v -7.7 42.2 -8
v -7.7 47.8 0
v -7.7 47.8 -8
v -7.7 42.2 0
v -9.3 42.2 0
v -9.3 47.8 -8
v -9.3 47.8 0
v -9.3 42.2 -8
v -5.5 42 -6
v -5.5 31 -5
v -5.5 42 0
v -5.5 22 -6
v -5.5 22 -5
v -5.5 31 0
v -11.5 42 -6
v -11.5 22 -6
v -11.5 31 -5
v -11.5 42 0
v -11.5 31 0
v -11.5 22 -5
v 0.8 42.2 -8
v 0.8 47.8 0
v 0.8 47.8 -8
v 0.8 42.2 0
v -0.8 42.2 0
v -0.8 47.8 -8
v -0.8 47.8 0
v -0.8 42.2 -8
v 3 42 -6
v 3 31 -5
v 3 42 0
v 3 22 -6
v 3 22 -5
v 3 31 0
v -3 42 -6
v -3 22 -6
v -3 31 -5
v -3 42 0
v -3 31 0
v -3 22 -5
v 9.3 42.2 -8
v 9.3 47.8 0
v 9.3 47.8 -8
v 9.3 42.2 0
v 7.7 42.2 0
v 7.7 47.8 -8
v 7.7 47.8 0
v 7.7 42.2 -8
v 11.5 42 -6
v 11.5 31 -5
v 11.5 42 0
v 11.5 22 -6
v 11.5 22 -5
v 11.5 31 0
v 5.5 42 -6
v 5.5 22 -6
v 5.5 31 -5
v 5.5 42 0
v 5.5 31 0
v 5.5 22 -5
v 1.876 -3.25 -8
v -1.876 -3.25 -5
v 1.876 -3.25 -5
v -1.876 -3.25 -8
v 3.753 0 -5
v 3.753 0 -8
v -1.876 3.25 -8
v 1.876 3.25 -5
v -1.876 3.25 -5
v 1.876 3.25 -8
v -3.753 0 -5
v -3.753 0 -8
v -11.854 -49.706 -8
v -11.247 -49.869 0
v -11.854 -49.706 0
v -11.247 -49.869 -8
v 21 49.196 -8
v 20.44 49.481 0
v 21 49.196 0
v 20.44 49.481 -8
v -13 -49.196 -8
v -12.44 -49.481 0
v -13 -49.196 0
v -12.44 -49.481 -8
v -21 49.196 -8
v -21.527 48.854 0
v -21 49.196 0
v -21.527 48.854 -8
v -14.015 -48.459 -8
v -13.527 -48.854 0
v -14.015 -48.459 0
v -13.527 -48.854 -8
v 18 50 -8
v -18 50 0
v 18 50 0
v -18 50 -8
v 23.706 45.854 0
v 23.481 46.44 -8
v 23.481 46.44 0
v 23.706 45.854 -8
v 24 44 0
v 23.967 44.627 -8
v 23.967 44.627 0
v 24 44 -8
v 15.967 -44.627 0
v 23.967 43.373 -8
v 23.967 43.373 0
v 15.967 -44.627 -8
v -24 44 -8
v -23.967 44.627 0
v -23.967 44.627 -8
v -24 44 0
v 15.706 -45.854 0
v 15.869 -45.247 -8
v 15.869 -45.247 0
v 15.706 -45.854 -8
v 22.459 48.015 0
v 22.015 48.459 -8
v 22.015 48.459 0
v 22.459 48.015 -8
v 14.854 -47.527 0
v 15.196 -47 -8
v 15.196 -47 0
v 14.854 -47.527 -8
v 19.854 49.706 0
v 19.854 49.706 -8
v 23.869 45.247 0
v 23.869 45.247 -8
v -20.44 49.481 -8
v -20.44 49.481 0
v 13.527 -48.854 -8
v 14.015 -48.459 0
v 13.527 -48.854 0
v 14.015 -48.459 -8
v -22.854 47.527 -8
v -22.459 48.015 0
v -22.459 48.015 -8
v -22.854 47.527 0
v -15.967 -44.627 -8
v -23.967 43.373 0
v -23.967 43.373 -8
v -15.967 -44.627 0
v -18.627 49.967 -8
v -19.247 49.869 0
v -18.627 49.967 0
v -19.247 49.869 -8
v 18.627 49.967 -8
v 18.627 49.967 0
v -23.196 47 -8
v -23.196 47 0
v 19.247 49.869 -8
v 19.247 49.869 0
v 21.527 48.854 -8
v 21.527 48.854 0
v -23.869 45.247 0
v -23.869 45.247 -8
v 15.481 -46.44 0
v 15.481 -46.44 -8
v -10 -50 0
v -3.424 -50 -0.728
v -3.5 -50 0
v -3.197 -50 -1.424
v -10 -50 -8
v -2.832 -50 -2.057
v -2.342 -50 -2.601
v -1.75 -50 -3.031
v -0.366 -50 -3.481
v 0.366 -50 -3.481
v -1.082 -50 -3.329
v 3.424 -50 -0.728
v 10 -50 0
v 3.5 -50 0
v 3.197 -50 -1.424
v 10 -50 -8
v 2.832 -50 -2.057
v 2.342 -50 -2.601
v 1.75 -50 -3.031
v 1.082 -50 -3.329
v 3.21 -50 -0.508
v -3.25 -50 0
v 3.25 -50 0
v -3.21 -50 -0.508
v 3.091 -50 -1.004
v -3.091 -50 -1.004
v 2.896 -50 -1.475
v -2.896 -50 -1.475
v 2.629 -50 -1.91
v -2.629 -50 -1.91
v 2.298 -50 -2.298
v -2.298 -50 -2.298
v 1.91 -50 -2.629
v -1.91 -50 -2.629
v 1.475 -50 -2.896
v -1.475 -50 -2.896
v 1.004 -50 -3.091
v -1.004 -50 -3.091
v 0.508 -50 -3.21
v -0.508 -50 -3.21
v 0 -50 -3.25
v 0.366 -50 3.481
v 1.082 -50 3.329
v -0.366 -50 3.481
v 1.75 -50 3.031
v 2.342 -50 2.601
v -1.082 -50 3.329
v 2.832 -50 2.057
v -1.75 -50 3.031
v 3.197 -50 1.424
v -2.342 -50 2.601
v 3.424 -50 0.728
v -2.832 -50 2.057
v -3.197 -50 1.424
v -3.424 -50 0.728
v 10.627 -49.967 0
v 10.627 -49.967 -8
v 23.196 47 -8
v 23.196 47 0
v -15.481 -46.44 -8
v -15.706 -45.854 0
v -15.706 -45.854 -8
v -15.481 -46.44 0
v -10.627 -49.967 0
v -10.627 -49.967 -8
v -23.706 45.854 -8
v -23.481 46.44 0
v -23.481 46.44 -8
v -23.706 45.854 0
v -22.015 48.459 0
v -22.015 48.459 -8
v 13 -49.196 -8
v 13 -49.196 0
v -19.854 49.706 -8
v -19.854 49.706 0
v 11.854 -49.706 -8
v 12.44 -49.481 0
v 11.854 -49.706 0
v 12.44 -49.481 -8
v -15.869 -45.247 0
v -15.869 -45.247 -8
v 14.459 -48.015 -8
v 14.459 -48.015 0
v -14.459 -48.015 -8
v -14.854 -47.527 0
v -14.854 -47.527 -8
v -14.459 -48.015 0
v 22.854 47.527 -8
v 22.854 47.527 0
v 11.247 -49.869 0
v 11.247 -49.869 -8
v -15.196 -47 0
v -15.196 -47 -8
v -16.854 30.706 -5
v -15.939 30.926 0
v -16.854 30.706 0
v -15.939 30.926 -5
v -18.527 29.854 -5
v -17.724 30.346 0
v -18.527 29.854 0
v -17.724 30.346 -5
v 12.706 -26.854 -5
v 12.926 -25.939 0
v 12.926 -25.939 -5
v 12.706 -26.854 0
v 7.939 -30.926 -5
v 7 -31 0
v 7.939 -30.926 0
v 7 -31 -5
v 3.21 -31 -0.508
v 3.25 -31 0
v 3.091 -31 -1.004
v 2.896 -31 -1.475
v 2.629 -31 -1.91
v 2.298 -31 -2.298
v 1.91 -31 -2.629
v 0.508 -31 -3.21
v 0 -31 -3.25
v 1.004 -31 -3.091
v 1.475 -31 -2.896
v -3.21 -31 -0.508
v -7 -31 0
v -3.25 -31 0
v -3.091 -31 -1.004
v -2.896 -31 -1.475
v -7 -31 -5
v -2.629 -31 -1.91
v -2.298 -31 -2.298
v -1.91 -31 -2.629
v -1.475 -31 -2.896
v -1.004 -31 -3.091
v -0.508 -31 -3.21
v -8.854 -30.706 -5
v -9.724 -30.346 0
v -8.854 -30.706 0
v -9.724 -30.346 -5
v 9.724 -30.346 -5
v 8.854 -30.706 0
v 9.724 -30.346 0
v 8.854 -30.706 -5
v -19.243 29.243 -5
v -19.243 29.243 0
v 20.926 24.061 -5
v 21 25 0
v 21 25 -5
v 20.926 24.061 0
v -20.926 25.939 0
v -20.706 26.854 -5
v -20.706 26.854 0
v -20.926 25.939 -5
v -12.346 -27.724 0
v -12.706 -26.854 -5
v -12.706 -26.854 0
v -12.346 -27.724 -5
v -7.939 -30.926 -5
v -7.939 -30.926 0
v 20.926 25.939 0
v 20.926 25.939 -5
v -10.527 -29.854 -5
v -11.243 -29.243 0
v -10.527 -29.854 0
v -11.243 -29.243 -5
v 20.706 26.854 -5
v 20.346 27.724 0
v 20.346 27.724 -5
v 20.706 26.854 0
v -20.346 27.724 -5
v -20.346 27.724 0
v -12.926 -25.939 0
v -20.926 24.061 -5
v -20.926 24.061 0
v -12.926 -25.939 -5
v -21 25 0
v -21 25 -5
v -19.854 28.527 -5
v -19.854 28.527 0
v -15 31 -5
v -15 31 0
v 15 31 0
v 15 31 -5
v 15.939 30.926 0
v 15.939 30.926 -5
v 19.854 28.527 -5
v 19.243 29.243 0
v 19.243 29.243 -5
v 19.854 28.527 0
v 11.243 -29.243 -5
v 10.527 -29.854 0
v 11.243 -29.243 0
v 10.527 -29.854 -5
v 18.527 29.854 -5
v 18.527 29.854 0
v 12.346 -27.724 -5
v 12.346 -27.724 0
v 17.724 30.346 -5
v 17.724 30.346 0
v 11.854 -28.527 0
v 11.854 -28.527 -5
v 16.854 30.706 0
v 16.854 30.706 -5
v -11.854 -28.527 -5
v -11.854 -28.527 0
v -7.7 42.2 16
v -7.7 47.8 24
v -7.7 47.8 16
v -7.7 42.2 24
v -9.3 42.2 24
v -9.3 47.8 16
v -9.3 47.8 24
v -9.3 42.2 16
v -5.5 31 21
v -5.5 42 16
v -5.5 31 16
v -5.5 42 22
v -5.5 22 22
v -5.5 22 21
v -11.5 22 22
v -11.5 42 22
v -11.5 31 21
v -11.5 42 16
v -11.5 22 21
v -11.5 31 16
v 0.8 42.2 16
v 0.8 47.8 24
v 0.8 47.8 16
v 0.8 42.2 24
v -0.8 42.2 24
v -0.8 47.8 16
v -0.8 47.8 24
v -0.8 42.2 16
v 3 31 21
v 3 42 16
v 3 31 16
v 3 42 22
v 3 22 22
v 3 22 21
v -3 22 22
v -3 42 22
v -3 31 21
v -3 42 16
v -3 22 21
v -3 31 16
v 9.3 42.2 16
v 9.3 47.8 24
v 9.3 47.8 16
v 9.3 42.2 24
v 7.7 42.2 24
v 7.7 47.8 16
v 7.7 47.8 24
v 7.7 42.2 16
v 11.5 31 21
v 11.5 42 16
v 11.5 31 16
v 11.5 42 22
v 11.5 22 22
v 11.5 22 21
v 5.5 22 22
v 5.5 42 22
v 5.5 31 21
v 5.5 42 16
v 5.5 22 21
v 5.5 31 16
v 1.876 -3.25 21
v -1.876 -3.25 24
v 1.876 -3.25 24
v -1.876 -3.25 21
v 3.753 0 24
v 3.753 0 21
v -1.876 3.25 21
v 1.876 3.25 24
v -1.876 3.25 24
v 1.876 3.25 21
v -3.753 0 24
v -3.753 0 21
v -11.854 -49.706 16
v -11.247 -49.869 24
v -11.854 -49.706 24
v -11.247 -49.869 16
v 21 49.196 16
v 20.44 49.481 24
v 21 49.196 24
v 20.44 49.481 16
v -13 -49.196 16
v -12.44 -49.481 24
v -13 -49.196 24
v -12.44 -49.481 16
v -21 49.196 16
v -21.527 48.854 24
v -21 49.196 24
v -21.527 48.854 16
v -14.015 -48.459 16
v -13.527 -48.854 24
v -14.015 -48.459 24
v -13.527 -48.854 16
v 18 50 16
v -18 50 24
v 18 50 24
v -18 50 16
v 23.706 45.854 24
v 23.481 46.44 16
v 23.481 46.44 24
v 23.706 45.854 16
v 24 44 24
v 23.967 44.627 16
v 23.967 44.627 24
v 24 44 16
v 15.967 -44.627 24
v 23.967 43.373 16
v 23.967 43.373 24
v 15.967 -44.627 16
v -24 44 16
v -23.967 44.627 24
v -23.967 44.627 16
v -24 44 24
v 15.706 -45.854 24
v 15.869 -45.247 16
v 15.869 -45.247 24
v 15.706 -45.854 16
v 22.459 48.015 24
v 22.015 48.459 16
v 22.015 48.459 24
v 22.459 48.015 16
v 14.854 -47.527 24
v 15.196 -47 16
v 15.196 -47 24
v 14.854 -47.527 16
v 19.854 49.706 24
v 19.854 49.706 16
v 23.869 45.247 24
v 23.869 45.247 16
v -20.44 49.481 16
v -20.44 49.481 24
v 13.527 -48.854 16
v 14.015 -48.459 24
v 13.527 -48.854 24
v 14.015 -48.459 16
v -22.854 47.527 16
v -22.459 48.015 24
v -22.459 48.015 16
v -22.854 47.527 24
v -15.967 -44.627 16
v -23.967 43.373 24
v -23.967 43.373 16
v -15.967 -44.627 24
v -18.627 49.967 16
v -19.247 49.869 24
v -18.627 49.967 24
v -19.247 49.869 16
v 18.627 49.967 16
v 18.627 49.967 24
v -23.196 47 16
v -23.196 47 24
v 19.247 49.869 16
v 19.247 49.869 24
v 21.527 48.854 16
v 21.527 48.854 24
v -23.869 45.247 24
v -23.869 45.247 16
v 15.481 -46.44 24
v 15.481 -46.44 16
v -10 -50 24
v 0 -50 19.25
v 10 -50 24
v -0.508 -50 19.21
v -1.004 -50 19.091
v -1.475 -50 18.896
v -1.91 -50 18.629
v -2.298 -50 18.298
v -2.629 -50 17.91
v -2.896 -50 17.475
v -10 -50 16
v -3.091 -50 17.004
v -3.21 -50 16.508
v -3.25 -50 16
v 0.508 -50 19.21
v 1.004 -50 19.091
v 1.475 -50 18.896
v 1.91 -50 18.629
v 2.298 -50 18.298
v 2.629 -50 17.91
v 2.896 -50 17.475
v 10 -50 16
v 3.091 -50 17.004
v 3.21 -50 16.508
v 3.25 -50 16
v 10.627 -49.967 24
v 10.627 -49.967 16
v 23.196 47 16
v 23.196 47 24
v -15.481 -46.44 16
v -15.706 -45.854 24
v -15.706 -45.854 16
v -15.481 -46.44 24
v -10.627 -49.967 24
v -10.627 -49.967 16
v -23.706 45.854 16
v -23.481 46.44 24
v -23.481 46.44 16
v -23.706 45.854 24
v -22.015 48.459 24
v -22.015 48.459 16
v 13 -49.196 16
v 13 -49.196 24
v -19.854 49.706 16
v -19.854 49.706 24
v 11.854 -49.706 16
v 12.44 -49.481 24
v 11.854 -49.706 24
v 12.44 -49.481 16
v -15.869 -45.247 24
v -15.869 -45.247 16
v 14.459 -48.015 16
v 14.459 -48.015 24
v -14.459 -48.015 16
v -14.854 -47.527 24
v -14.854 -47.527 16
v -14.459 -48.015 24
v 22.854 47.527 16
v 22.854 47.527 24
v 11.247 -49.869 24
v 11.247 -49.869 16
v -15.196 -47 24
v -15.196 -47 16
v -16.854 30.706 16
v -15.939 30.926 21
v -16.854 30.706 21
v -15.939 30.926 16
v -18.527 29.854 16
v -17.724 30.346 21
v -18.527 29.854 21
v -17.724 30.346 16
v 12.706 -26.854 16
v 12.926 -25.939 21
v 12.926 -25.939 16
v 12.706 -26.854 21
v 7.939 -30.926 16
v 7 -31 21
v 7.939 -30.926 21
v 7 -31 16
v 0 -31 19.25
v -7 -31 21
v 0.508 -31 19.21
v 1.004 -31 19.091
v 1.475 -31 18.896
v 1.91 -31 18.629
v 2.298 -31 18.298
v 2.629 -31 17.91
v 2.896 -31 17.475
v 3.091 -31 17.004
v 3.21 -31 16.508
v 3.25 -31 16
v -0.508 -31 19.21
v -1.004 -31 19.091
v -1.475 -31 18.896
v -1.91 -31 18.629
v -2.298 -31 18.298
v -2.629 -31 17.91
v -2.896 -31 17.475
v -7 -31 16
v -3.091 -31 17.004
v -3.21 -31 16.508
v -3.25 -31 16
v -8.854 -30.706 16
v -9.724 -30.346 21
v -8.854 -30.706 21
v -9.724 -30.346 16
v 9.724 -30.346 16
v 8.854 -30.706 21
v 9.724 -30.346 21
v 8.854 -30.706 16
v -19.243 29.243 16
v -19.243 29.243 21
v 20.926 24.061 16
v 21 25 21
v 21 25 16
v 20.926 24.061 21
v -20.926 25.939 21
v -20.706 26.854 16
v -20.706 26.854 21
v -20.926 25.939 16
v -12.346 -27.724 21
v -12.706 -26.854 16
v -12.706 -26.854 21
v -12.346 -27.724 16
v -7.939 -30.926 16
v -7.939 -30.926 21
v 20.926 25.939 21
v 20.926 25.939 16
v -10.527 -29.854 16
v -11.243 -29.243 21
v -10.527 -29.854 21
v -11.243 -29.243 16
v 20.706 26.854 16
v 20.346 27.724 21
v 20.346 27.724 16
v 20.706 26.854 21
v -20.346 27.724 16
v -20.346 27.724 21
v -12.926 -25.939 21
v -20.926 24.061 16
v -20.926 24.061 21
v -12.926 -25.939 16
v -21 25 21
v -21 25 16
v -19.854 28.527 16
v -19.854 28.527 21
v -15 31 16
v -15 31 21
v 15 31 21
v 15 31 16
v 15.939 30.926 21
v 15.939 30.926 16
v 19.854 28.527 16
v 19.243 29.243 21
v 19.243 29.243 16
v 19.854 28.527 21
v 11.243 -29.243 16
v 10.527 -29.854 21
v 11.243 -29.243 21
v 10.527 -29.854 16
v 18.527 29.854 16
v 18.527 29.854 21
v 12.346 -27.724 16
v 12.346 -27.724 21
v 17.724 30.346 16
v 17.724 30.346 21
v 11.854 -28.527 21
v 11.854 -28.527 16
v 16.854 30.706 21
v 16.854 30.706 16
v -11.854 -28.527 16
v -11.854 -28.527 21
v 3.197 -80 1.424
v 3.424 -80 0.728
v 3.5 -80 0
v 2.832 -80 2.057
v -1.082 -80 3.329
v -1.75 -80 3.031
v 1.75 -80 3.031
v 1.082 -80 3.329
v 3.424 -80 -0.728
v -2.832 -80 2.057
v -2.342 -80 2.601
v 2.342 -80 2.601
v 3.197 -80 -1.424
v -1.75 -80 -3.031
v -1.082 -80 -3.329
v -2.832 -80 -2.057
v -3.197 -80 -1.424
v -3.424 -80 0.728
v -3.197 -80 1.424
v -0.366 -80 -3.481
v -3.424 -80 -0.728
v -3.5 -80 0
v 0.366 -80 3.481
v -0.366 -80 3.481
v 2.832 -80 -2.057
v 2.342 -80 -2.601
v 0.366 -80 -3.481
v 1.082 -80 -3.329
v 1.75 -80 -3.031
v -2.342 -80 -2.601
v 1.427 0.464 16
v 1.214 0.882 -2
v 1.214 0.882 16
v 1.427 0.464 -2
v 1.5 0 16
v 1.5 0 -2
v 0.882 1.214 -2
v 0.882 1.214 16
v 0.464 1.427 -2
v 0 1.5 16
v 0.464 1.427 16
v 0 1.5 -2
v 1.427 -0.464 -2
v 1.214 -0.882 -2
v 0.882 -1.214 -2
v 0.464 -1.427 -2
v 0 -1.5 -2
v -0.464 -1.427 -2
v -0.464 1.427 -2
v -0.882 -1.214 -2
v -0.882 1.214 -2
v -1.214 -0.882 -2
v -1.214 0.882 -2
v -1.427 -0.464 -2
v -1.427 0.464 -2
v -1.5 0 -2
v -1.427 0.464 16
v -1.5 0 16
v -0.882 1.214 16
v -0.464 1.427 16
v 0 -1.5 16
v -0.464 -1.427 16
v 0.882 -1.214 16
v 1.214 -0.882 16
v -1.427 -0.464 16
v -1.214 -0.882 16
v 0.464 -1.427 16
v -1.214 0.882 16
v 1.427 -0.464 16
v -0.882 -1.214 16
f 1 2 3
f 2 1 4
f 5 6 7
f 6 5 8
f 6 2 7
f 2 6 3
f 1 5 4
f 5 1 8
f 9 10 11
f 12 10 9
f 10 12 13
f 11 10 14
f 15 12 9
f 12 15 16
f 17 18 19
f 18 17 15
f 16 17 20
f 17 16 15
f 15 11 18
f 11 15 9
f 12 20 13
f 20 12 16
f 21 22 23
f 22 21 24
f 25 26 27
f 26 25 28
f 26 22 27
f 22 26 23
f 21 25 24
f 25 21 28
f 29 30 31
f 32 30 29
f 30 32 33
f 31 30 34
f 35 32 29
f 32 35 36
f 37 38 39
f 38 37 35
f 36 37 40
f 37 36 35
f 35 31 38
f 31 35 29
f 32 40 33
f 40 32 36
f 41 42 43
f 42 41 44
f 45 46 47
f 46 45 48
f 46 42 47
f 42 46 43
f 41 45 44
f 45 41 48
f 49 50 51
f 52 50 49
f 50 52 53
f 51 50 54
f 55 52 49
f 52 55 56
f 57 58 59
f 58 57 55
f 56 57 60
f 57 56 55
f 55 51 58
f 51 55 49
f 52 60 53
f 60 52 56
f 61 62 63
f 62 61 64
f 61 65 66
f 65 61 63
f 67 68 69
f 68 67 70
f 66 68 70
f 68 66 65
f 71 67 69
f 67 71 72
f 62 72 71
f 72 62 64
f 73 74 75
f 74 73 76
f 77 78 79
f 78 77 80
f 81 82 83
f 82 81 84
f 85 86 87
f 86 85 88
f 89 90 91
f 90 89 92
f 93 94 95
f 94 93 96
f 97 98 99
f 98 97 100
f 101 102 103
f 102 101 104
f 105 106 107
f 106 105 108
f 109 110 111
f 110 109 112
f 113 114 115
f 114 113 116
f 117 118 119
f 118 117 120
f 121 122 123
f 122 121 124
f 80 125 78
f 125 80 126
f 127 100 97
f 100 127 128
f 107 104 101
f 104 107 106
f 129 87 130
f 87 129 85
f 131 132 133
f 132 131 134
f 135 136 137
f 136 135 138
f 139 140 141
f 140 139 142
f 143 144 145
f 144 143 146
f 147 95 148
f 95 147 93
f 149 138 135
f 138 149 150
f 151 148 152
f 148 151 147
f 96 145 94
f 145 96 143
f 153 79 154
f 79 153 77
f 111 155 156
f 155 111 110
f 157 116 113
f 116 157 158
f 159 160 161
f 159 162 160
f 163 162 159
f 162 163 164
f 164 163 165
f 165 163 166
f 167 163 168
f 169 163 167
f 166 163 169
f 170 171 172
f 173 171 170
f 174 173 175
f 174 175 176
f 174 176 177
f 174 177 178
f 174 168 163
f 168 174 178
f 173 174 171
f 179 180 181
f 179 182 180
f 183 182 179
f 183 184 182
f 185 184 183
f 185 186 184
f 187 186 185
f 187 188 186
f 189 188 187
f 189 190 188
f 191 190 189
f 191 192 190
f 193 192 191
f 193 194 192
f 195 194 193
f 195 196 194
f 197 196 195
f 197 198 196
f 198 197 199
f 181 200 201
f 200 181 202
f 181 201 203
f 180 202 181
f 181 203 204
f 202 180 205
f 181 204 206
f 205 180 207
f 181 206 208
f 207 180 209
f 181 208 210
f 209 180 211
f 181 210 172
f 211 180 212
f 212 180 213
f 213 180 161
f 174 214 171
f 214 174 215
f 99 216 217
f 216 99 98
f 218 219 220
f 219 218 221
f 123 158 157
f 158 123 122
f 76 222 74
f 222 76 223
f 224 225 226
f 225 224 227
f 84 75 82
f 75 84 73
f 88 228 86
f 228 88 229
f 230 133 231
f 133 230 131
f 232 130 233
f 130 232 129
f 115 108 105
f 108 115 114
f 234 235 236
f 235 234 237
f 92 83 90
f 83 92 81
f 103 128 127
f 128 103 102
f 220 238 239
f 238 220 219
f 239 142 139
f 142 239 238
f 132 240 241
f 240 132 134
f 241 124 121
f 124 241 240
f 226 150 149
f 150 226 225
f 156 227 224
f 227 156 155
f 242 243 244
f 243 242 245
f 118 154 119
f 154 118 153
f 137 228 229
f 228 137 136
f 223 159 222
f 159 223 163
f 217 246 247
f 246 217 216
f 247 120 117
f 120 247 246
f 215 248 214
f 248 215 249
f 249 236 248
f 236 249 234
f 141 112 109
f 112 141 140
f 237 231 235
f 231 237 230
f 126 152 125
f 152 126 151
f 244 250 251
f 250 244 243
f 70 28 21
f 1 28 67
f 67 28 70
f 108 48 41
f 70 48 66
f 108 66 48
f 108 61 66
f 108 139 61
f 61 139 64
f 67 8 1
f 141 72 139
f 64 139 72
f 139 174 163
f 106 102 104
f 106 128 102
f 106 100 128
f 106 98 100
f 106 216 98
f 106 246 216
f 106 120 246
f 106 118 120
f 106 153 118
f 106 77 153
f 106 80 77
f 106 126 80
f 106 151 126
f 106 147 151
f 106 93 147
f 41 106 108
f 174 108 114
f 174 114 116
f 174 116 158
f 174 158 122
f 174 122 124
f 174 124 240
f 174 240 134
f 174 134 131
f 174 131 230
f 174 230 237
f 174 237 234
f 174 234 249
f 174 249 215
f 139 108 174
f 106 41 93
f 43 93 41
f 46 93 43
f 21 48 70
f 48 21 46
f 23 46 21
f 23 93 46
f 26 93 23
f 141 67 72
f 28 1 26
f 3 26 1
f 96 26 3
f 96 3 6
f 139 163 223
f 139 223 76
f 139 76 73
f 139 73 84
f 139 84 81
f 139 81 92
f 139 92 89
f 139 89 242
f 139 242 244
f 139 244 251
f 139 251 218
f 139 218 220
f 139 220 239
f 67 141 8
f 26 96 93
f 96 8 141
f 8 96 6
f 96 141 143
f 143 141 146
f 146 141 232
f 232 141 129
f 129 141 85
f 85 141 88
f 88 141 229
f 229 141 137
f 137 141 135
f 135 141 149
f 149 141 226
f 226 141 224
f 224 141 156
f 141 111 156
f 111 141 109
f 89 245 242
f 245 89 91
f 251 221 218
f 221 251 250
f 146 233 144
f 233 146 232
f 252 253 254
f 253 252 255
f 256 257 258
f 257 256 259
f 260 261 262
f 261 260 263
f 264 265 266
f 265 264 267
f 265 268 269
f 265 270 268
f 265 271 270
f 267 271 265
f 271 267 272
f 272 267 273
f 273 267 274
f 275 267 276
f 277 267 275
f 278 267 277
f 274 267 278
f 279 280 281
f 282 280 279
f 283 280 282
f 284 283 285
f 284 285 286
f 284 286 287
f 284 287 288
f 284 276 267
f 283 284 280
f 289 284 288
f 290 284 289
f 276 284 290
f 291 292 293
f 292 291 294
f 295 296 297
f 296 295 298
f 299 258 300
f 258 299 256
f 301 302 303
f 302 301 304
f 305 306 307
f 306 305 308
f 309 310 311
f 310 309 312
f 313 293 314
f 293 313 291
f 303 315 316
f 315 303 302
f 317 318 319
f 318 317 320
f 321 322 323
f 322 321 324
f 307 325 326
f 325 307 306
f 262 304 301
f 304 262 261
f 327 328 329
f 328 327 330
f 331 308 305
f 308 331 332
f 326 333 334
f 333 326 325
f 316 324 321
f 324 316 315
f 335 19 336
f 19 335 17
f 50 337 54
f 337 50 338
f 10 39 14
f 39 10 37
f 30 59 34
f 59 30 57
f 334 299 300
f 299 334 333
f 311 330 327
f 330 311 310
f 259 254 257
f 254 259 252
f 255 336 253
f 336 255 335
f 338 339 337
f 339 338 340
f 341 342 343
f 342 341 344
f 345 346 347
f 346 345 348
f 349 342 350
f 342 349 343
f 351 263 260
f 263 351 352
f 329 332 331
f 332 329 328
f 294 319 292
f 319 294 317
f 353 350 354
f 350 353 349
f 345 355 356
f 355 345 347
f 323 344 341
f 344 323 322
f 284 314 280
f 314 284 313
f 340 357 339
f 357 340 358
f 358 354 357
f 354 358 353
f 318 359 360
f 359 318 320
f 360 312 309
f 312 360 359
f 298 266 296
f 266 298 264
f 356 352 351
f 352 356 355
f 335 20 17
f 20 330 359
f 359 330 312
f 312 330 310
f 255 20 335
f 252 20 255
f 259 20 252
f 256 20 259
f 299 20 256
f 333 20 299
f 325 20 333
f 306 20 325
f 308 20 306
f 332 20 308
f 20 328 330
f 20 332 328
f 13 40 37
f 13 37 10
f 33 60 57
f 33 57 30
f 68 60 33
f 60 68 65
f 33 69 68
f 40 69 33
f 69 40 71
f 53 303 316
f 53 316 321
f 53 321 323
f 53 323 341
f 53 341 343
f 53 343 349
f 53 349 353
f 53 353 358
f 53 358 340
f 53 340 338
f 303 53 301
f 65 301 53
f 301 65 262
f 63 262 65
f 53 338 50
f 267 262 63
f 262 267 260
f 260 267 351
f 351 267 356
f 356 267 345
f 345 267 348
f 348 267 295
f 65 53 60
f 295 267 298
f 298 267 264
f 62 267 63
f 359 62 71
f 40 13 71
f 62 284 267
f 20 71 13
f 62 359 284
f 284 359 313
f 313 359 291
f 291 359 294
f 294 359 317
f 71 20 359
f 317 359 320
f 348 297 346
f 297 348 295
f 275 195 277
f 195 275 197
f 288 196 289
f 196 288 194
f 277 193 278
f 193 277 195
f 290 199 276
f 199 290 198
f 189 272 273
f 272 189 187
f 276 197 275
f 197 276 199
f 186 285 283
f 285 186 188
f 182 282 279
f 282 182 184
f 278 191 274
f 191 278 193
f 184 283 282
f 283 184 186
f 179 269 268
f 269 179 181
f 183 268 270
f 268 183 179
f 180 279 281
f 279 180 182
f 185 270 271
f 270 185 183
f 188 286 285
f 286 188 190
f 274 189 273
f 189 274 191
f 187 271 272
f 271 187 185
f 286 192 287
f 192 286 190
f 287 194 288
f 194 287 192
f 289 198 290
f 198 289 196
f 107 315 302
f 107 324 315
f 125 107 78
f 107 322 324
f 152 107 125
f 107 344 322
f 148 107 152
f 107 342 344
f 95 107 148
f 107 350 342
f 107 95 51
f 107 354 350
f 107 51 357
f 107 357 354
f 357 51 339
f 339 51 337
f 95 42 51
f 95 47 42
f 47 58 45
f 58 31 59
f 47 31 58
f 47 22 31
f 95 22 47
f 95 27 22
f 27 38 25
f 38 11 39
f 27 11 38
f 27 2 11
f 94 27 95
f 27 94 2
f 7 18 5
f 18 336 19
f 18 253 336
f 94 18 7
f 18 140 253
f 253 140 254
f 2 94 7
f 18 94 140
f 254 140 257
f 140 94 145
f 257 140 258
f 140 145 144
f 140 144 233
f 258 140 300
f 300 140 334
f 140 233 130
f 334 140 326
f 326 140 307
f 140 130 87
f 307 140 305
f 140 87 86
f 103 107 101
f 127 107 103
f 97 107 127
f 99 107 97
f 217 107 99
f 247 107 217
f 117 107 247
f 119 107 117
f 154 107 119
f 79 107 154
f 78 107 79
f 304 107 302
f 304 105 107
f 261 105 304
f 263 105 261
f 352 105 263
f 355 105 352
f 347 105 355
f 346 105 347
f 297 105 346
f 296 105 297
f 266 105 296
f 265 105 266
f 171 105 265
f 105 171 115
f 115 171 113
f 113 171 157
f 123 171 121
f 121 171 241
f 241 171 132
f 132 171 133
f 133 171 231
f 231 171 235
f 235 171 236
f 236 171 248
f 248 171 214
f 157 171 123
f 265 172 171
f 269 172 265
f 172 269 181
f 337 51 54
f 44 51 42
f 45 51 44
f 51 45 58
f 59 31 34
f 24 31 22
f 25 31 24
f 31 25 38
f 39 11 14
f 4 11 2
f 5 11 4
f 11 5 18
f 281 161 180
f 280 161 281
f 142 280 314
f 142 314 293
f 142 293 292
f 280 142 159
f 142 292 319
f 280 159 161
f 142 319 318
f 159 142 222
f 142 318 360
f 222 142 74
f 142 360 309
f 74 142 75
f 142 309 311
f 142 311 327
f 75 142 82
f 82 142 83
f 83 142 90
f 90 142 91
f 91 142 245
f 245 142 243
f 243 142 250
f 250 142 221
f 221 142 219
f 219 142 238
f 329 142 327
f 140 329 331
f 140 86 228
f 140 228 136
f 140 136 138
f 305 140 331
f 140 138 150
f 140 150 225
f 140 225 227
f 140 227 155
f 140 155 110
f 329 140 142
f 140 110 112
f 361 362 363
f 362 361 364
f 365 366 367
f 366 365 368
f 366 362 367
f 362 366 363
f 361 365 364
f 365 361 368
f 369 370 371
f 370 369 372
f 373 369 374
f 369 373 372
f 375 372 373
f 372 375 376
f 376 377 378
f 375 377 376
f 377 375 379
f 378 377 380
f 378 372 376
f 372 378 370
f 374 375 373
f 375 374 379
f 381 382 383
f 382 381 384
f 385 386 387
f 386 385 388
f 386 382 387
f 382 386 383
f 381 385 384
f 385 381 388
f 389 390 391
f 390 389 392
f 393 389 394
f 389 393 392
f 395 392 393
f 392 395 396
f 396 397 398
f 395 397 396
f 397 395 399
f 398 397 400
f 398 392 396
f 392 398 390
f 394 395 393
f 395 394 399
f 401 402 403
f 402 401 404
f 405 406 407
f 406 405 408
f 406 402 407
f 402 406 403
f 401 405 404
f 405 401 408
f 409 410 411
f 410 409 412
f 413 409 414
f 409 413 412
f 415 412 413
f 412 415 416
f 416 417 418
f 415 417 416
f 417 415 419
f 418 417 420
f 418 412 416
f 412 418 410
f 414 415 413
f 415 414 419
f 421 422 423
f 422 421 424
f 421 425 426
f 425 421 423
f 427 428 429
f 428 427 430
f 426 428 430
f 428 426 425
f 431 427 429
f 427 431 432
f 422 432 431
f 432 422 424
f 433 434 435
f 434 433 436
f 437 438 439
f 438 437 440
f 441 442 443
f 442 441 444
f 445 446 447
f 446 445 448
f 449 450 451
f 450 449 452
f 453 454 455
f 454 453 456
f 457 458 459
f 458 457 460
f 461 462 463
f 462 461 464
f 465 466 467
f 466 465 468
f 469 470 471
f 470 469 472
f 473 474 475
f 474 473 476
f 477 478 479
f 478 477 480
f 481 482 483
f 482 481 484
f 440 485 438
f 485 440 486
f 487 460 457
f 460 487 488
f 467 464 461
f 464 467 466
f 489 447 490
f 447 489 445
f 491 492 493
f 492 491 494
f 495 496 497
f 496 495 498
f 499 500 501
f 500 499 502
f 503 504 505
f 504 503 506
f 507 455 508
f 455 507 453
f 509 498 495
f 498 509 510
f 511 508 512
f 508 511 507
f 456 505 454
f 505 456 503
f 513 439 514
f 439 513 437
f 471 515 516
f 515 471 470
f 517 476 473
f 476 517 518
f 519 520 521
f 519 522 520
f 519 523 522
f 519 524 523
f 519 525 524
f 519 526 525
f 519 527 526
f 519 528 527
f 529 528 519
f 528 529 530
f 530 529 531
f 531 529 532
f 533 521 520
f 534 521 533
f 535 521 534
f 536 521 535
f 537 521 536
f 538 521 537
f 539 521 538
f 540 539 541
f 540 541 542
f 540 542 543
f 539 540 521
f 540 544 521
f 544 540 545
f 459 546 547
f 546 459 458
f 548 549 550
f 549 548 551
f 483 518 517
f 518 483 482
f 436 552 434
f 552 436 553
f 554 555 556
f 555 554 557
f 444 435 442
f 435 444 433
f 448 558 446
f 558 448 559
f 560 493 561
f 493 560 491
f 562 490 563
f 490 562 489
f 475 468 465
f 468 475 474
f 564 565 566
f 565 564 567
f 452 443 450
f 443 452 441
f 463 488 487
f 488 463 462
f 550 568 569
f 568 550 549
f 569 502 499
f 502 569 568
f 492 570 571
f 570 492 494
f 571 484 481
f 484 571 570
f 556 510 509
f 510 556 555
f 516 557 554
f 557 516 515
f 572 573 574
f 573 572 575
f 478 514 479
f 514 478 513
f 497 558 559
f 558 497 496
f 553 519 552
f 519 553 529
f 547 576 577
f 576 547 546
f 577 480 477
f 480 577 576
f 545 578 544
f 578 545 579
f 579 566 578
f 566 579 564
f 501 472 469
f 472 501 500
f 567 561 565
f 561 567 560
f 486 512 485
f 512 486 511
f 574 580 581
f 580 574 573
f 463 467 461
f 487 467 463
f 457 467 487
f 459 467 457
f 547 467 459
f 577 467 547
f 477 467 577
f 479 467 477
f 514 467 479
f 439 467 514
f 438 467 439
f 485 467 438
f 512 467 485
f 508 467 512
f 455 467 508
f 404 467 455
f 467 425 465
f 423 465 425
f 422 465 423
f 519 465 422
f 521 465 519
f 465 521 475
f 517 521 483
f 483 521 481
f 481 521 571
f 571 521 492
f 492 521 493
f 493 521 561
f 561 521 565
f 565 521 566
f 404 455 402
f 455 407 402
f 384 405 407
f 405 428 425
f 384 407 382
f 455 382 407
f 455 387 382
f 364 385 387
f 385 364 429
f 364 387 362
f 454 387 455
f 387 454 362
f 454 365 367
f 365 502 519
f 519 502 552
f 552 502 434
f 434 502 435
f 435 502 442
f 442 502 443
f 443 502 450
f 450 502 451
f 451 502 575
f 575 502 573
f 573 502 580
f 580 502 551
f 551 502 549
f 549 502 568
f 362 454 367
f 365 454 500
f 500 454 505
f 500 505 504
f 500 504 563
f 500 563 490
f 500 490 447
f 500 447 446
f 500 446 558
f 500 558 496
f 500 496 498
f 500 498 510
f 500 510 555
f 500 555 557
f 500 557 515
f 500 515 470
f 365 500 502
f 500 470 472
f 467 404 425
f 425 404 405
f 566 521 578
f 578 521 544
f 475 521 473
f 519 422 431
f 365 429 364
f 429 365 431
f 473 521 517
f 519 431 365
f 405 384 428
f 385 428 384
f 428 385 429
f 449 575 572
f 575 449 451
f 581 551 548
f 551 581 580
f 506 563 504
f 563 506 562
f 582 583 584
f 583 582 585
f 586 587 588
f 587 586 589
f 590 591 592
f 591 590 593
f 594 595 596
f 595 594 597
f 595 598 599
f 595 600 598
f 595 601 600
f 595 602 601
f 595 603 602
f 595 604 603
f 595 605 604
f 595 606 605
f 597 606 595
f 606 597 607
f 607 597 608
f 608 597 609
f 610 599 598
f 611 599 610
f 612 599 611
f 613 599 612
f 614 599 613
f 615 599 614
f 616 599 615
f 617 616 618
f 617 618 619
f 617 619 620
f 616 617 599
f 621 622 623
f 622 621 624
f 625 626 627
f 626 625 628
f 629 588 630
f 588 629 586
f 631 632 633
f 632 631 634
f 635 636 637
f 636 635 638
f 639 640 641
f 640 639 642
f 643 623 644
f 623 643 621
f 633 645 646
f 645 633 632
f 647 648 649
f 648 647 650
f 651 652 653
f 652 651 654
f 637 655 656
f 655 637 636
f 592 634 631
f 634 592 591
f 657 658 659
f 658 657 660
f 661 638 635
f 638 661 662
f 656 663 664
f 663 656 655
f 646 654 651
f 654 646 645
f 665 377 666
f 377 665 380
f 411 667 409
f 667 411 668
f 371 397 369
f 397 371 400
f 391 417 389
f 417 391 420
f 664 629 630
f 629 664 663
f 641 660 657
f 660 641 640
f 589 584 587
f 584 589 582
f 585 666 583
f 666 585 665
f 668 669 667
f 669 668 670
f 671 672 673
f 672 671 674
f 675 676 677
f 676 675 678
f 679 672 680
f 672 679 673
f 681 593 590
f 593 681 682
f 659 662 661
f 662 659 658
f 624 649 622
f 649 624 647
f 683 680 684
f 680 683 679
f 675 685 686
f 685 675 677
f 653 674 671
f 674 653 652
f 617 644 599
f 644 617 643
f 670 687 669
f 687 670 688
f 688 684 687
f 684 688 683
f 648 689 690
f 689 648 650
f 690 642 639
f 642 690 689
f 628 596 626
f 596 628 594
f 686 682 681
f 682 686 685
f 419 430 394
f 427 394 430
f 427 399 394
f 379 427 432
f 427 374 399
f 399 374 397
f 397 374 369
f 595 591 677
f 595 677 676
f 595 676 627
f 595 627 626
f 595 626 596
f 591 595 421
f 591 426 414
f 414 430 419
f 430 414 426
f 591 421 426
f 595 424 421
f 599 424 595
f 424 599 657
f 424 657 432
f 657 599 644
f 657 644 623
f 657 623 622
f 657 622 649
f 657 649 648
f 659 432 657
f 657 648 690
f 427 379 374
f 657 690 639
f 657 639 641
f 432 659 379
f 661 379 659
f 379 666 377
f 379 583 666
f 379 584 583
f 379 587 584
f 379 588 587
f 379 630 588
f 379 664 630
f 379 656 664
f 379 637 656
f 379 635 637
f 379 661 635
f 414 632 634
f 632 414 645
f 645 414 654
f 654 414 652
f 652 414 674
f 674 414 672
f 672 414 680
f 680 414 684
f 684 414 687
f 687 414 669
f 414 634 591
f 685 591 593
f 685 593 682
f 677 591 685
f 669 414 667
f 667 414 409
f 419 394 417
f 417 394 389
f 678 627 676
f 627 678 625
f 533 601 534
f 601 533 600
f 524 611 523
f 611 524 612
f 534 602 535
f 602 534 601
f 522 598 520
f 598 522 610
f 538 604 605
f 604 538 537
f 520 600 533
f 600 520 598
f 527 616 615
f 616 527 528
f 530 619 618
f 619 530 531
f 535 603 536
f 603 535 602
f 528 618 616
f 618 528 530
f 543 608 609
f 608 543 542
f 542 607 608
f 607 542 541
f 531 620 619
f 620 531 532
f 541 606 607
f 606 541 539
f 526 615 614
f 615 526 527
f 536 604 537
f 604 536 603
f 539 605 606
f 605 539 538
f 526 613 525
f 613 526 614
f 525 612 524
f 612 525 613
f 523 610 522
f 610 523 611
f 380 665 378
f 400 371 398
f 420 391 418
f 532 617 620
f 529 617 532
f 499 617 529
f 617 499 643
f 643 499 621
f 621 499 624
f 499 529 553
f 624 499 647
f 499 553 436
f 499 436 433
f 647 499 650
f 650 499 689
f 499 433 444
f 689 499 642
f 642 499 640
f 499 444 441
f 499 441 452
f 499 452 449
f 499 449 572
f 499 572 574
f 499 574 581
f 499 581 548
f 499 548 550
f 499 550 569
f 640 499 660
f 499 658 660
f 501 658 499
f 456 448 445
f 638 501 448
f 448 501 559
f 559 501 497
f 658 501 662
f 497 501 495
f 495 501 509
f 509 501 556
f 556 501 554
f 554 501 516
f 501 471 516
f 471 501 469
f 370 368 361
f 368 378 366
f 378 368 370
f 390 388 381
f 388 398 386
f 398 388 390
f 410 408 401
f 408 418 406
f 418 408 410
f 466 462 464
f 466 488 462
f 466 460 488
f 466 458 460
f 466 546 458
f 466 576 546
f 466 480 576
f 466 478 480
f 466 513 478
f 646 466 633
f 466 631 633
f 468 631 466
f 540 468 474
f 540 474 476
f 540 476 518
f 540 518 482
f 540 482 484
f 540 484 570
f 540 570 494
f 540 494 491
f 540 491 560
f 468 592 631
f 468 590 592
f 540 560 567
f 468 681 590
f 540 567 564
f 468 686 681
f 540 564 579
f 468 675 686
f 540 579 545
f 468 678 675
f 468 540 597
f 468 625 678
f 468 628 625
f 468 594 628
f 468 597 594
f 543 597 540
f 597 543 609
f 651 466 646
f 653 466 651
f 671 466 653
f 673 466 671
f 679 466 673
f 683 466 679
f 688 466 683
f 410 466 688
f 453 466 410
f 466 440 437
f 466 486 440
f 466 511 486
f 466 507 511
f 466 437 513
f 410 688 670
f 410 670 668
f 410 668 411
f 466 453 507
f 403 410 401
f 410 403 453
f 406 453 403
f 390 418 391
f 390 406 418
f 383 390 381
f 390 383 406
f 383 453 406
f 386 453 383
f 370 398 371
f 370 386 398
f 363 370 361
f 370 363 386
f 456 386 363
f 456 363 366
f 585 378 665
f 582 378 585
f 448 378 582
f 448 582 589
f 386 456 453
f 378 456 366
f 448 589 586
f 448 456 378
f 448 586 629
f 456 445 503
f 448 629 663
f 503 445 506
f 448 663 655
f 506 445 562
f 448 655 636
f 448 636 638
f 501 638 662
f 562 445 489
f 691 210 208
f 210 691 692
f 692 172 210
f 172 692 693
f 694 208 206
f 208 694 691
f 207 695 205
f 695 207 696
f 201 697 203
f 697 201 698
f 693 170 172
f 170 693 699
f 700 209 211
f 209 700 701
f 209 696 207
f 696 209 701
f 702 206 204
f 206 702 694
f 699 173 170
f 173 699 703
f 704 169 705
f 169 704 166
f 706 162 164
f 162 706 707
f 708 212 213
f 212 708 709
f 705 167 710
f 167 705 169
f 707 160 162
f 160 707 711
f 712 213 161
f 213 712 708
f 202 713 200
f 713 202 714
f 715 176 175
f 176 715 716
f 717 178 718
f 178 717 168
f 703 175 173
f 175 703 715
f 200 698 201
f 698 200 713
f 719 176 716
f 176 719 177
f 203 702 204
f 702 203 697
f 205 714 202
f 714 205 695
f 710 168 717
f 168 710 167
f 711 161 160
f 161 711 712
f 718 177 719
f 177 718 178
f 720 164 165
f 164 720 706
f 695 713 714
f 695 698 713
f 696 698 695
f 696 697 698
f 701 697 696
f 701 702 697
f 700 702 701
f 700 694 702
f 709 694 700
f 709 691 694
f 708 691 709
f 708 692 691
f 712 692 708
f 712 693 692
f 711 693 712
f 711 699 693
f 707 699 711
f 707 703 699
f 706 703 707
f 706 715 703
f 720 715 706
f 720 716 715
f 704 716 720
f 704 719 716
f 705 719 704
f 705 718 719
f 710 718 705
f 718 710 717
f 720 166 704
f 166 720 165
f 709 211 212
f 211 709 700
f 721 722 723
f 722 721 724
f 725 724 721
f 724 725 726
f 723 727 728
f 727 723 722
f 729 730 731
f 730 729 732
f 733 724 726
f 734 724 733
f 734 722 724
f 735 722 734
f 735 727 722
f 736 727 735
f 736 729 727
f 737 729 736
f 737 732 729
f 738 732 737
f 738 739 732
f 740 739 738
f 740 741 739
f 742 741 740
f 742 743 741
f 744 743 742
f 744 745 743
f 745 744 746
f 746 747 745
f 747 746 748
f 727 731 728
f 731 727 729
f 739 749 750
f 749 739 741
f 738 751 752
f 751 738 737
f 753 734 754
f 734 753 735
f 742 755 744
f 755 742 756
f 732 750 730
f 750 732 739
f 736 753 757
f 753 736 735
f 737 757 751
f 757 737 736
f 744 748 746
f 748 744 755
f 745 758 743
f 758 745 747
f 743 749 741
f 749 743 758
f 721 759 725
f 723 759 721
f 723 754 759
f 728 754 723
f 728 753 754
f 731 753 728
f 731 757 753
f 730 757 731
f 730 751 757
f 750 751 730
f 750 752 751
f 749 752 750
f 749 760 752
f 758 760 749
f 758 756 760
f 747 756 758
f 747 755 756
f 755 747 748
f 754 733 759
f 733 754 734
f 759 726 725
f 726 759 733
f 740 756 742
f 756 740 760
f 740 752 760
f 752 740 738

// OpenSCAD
// file: elna_plug_option2_parametric.scad
// Opcja 2: Pełny model parametryczny tworzony od zera
// Odbudowany na podstawie przybliżonych gabarytów oryginalnej wtyczki (48x100mm)

render_part = "bottom"; // [top, bottom, both]

// Gabaryty
plug_width = 48.0;
plug_length = 100.0;
plug_height = 16.0; // pełna wysokość złączonych 2 połówek
corner_radius = 6.0;
back_taper = 8.0; // zwężenie z tyłu wtyczki

// Tolerancja druku
print_tolerance = 0.2; 

// Piny
pin_spacing = 8.5; 
pin_slot_width = 1.6 + print_tolerance;
pin_slot_length = 5.6 + print_tolerance;

module outer_shell() {
    hull() {
        // Przednie rogi (strona wtykana do maszyny)
        translate([plug_width/2 - corner_radius, plug_length/2 - corner_radius, 0]) 
            cylinder(r=corner_radius, h=plug_height, center=true, $fn=50);
        translate([-plug_width/2 + corner_radius, plug_length/2 - corner_radius, 0]) 
            cylinder(r=corner_radius, h=plug_height, center=true, $fn=50);
            
        // Tylne rogi (zwężone na dłoń i kabel)
        translate([plug_width/2 - corner_radius - back_taper, -plug_length/2 + corner_radius, 0]) 
            cylinder(r=corner_radius, h=plug_height, center=true, $fn=50);
        translate([-plug_width/2 + corner_radius + back_taper, -plug_length/2 + corner_radius, 0]) 
            cylinder(r=corner_radius, h=plug_height, center=true, $fn=50);
    }
}

module screw_holes() {
    translate([0, 0, 0]) {
        cylinder(d=3.2, h=plug_height+2, center=true, $fn=30);
        translate([0, 0, plug_height/2 - 3]) cylinder(d=6.0, h=6.5, center=true, $fn=30);
        translate([0, 0, -plug_height/2 + 3]) cylinder(d=6.5 / cos(30), h=6.5, center=true, $fn=6); 
    }
}

module cable_strain_relief() {
    translate([0, -plug_length/2 + 10, 0]) {
        rotate([90,0,0]) cylinder(d=6.5, h=25, center=true, $fn=30);
        for(y = [-4: 4: 4]) {
            translate([0, y, 0])
                rotate([0, 90, 0]) cylinder(d=5.0, h=8.0, center=true, $fn=30);
        }
    }
}

module pin_slots() {
    // 3 piny ustawione pionowo
    for(x = [-pin_spacing, 0, pin_spacing]) {
        // Wylot pinu
        translate([x, plug_length/2 - 5, 0])
            cube([pin_slot_width, pin_slot_length, plug_height + 2], center=true);
            
        // Wnęka na złącze
        translate([x, plug_length/2 - 18, 0])
            cube([6.0, 20.0, plug_height - 4], center=true);
    }
}

module inner_cavity() {
    // Główna komora wewnątrz wtyczki na ułożenie przewodów
    hull() {
        // Przednia część komory (blisko wnęk na złącza)
        translate([plug_width/2 - corner_radius - 3, plug_length/2 - 25, 0]) 
            cylinder(r=corner_radius, h=plug_height - 6, center=true, $fn=30);
        translate([-plug_width/2 + corner_radius + 3, plug_length/2 - 25, 0]) 
            cylinder(r=corner_radius, h=plug_height - 6, center=true, $fn=30);
            
        // Tylna część komory (zbliża się do wlotu kabla)
        translate([plug_width/2 - corner_radius - back_taper - 3, -plug_length/2 + 25, 0]) 
            cylinder(r=corner_radius, h=plug_height - 6, center=true, $fn=30);
        translate([-plug_width/2 + corner_radius + back_taper + 3, -plug_length/2 + 25, 0]) 
            cylinder(r=corner_radius, h=plug_height - 6, center=true, $fn=30);
    }
}

module elna_plug_option2() {
    difference() {
        outer_shell();
        inner_cavity();
        screw_holes();
        cable_strain_relief();
        pin_slots();
    }
}

module render_split() {
    if (render_part == "both") {
        elna_plug_option2();
    } else if (render_part == "bottom") {
        difference() {
            elna_plug_option2();
            translate([0, 0, plug_height]) cube([plug_width+5, plug_length+5, plug_height*2], center=true);
        }
    } else if (render_part == "top") {
        rotate([180, 0, 0]) difference() {
            elna_plug_option2();
            translate([0, 0, -plug_height]) cube([plug_width+5, plug_length+5, plug_height*2], center=true);
        }
    }
}

render_split();
// main file
// Scena poglądowa wtyczki Elna - Widok złożony i rozłożony
// Zawiera kabel, mosiężne wsuwki/gniazda i obie połówki obudowy

use <elna_plug_option2_parametric.scad>

// =====================
// PARAMETRY SCENY
// =====================
view_mode = "assembled"; // ["assembled", "exploded"]

// Parametry wtyczki (muszą być spójne z option2)
plug_width = 48.0;
plug_length = 100.0;
plug_height = 16.0;
corner_radius = 6.0;
back_taper = 8.0;
pin_spacing = 8.5;
pin_slot_width = 1.6;
pin_slot_length = 5.6;
print_tolerance = 0.2;

// Grubość ściany obudowy
wall = 3.0;

// Odstęp w widoku rozłożonym
explode_gap = 20;

// =====================
// BRYŁY POMOCNICZE
// =====================

module outer_hull() {
    hull() {
        translate([ plug_width/2 - corner_radius,  plug_length/2 - corner_radius, 0]) cylinder(r=corner_radius, h=plug_height, center=true, $fn=60);
        translate([-plug_width/2 + corner_radius,  plug_length/2 - corner_radius, 0]) cylinder(r=corner_radius, h=plug_height, center=true, $fn=60);
        translate([ plug_width/2 - corner_radius - back_taper, -plug_length/2 + corner_radius, 0]) cylinder(r=corner_radius, h=plug_height, center=true, $fn=60);
        translate([-plug_width/2 + corner_radius + back_taper, -plug_length/2 + corner_radius, 0]) cylinder(r=corner_radius, h=plug_height, center=true, $fn=60);
    }
}

module half_plug_body(flip=false) {
    rot = flip ? [180, 0, 0] : [0, 0, 0];
    rotate(rot) {
        difference() {
            outer_hull();
            // Wnętrze komory
            hull() {
                translate([ plug_width/2 - corner_radius - 3,  plug_length/2 - 25, 0]) cylinder(r=corner_radius, h=plug_height-6, center=true, $fn=40);
                translate([-plug_width/2 + corner_radius + 3,  plug_length/2 - 25, 0]) cylinder(r=corner_radius, h=plug_height-6, center=true, $fn=40);
                translate([ plug_width/2 - corner_radius - back_taper - 3, -plug_length/2 + 25, 0]) cylinder(r=corner_radius, h=plug_height-6, center=true, $fn=40);
                translate([-plug_width/2 + corner_radius + back_taper + 3, -plug_length/2 + 25, 0]) cylinder(r=corner_radius, h=plug_height-6, center=true, $fn=40);
            }
            // Kanał kabla
            translate([0, -plug_length/2 + 10, 0]) rotate([90,0,0]) cylinder(d=6.5, h=25, center=true, $fn=40);
            // Otwory na piny
            for(x = [-pin_spacing, 0, pin_spacing]) {
                translate([x, plug_length/2 - 5, 0]) cube([pin_slot_width, pin_slot_length, plug_height+2], center=true);
                translate([x, plug_length/2 - 18, 0]) cube([6.0, 20.0, plug_height - 4], center=true);
            }
            // Śruba centralna
            translate([0, 0, 0]) {
                cylinder(d=3.2, h=plug_height+2, center=true, $fn=30);
                translate([0,0, plug_height/2 - 3]) cylinder(d=6.0, h=6.5, center=true, $fn=30);
                translate([0,0,-plug_height/2 + 3]) cylinder(d=6.5/cos(30), h=6.5, center=true, $fn=6);
            }
            // Odcinamy połówkę (zawsze bierzemy dolną, flip=true ją obraca)
            translate([0, 0, plug_height]) cube([plug_width+10, plug_length+10, plug_height*2], center=true);
        }
    }
}

// =====================
// ELEMENTY WNĘTRZA
// =====================

// Mosiężna wsuwka (żeńskie gniazdo)
module brass_connector(height=12) {
    color("goldenrod") {
        // Główna rurka wsuwki
        difference() {
            cylinder(d=5.0, h=height, center=true, $fn=20);
            cylinder(d=3.5, h=height+1, center=true, $fn=20);
        }
        // Kołnierz tylny
        translate([0, 0, -height/2 + 1]) cylinder(d=6.5, h=2, center=true, $fn=20);
        // Skrzydełka zaciskowe (blaszki)
        for(a = [0, 180]) rotate([0, 0, a]) translate([3, 0, height/2 - 3]) {
            cube([2, 1, 6], center=true);
        }
    }
}

// Końcówka przewodu z blaszką zaciskową
module wire_with_connector(wire_len=50, wire_d=1.5, col="red") {
    color("goldenrod") {
        translate([0, 0, wire_len/2]) cylinder(d=5.0, h=8, center=true, $fn=20);
    }
    color(col) {
        cylinder(d=wire_d, h=wire_len, center=true, $fn=16);
    }
}

// Kabel zbiorczy z opleceniem
module cable(len=70) {
    // Izolacja zewnętrzna
    color("black", 0.9) cylinder(d=7.0, h=len, center=true, $fn=30);
    // Żyły wewnętrzne (3 przewody w wiązce)
    color("brown") translate([1.5, 0, 0])  cylinder(d=2.0, h=len, center=true, $fn=16);
    color("blue")  translate([-1.5, 0, 0]) cylinder(d=2.0, h=len, center=true, $fn=16);
    color("yellow") translate([0, 0, 0])   cylinder(d=2.0, h=len-5, center=true, $fn=16);
}

// =====================
// WIDOKI
// =====================

module scene_assembled() {
    // Dolna połówka
    color("#3a7bd5", 0.85) half_plug_body(flip=false);
    
    // Górna połówka (odbita i uniesiona na właściwą wysokość)
    color("#3a7bd5", 0.85) translate([0, 0, plug_height]) mirror([0,0,1]) half_plug_body(flip=false);
    
    // Kabel wychodzący z tyłu
    translate([0, -plug_length/2 - 15, 0]) rotate([90, 0, 0]) cable(len=30);
    
    // Śruba centralna
    color("silver") translate([0, 0, plug_height/2 - 1]) cylinder(d=3.0, h=plug_height+2, center=true, $fn=20);
}

module scene_exploded() {
    e = explode_gap;
    
    // Górna połówka (uniesiona)
    color("#3a7bd5", 0.9) translate([0, 0, plug_height/2 + e]) half_plug_body(flip=false);
    
    // Dolna połówka
    color("#3a7bd5", 0.9) translate([0, 0, -plug_height/2]) half_plug_body(flip=false);
    
    // Mosiężne wsuwki (widoczne w przestrzeni między połówkami)
    for(x = [-pin_spacing, 0, pin_spacing]) {
        translate([x, plug_length/2 - 14, 0]) rotate([90, 0, 0]) brass_connector(height=12);
    }
    
    // Przewody elektryczne
    color("brown") translate([-pin_spacing, 0, 0]) rotate([90, 0, 0]) wire_with_connector(wire_len=55, col="brown");
    color("blue")  translate([0,  0, 0]) rotate([90, 0, 0]) wire_with_connector(wire_len=55, col="blue");
    color("yellow") translate([pin_spacing, 0, 0]) rotate([90, 0, 0]) wire_with_connector(wire_len=55, col="yellow");
    
    // Kabel zbiorczy
    translate([0, -plug_length/2 - 15, 0]) rotate([90, 0, 0]) cable(len=30);
    
    // Śruba
    color("silver") translate([0, 0, e + plug_height/2 + 5]) cylinder(d=3.0, h=plug_height+5, center=true, $fn=20);
}

// =====================
// RENDER
// =====================

if (view_mode == "assembled") {
    scene_assembled();
} else {
    scene_exploded();
}
